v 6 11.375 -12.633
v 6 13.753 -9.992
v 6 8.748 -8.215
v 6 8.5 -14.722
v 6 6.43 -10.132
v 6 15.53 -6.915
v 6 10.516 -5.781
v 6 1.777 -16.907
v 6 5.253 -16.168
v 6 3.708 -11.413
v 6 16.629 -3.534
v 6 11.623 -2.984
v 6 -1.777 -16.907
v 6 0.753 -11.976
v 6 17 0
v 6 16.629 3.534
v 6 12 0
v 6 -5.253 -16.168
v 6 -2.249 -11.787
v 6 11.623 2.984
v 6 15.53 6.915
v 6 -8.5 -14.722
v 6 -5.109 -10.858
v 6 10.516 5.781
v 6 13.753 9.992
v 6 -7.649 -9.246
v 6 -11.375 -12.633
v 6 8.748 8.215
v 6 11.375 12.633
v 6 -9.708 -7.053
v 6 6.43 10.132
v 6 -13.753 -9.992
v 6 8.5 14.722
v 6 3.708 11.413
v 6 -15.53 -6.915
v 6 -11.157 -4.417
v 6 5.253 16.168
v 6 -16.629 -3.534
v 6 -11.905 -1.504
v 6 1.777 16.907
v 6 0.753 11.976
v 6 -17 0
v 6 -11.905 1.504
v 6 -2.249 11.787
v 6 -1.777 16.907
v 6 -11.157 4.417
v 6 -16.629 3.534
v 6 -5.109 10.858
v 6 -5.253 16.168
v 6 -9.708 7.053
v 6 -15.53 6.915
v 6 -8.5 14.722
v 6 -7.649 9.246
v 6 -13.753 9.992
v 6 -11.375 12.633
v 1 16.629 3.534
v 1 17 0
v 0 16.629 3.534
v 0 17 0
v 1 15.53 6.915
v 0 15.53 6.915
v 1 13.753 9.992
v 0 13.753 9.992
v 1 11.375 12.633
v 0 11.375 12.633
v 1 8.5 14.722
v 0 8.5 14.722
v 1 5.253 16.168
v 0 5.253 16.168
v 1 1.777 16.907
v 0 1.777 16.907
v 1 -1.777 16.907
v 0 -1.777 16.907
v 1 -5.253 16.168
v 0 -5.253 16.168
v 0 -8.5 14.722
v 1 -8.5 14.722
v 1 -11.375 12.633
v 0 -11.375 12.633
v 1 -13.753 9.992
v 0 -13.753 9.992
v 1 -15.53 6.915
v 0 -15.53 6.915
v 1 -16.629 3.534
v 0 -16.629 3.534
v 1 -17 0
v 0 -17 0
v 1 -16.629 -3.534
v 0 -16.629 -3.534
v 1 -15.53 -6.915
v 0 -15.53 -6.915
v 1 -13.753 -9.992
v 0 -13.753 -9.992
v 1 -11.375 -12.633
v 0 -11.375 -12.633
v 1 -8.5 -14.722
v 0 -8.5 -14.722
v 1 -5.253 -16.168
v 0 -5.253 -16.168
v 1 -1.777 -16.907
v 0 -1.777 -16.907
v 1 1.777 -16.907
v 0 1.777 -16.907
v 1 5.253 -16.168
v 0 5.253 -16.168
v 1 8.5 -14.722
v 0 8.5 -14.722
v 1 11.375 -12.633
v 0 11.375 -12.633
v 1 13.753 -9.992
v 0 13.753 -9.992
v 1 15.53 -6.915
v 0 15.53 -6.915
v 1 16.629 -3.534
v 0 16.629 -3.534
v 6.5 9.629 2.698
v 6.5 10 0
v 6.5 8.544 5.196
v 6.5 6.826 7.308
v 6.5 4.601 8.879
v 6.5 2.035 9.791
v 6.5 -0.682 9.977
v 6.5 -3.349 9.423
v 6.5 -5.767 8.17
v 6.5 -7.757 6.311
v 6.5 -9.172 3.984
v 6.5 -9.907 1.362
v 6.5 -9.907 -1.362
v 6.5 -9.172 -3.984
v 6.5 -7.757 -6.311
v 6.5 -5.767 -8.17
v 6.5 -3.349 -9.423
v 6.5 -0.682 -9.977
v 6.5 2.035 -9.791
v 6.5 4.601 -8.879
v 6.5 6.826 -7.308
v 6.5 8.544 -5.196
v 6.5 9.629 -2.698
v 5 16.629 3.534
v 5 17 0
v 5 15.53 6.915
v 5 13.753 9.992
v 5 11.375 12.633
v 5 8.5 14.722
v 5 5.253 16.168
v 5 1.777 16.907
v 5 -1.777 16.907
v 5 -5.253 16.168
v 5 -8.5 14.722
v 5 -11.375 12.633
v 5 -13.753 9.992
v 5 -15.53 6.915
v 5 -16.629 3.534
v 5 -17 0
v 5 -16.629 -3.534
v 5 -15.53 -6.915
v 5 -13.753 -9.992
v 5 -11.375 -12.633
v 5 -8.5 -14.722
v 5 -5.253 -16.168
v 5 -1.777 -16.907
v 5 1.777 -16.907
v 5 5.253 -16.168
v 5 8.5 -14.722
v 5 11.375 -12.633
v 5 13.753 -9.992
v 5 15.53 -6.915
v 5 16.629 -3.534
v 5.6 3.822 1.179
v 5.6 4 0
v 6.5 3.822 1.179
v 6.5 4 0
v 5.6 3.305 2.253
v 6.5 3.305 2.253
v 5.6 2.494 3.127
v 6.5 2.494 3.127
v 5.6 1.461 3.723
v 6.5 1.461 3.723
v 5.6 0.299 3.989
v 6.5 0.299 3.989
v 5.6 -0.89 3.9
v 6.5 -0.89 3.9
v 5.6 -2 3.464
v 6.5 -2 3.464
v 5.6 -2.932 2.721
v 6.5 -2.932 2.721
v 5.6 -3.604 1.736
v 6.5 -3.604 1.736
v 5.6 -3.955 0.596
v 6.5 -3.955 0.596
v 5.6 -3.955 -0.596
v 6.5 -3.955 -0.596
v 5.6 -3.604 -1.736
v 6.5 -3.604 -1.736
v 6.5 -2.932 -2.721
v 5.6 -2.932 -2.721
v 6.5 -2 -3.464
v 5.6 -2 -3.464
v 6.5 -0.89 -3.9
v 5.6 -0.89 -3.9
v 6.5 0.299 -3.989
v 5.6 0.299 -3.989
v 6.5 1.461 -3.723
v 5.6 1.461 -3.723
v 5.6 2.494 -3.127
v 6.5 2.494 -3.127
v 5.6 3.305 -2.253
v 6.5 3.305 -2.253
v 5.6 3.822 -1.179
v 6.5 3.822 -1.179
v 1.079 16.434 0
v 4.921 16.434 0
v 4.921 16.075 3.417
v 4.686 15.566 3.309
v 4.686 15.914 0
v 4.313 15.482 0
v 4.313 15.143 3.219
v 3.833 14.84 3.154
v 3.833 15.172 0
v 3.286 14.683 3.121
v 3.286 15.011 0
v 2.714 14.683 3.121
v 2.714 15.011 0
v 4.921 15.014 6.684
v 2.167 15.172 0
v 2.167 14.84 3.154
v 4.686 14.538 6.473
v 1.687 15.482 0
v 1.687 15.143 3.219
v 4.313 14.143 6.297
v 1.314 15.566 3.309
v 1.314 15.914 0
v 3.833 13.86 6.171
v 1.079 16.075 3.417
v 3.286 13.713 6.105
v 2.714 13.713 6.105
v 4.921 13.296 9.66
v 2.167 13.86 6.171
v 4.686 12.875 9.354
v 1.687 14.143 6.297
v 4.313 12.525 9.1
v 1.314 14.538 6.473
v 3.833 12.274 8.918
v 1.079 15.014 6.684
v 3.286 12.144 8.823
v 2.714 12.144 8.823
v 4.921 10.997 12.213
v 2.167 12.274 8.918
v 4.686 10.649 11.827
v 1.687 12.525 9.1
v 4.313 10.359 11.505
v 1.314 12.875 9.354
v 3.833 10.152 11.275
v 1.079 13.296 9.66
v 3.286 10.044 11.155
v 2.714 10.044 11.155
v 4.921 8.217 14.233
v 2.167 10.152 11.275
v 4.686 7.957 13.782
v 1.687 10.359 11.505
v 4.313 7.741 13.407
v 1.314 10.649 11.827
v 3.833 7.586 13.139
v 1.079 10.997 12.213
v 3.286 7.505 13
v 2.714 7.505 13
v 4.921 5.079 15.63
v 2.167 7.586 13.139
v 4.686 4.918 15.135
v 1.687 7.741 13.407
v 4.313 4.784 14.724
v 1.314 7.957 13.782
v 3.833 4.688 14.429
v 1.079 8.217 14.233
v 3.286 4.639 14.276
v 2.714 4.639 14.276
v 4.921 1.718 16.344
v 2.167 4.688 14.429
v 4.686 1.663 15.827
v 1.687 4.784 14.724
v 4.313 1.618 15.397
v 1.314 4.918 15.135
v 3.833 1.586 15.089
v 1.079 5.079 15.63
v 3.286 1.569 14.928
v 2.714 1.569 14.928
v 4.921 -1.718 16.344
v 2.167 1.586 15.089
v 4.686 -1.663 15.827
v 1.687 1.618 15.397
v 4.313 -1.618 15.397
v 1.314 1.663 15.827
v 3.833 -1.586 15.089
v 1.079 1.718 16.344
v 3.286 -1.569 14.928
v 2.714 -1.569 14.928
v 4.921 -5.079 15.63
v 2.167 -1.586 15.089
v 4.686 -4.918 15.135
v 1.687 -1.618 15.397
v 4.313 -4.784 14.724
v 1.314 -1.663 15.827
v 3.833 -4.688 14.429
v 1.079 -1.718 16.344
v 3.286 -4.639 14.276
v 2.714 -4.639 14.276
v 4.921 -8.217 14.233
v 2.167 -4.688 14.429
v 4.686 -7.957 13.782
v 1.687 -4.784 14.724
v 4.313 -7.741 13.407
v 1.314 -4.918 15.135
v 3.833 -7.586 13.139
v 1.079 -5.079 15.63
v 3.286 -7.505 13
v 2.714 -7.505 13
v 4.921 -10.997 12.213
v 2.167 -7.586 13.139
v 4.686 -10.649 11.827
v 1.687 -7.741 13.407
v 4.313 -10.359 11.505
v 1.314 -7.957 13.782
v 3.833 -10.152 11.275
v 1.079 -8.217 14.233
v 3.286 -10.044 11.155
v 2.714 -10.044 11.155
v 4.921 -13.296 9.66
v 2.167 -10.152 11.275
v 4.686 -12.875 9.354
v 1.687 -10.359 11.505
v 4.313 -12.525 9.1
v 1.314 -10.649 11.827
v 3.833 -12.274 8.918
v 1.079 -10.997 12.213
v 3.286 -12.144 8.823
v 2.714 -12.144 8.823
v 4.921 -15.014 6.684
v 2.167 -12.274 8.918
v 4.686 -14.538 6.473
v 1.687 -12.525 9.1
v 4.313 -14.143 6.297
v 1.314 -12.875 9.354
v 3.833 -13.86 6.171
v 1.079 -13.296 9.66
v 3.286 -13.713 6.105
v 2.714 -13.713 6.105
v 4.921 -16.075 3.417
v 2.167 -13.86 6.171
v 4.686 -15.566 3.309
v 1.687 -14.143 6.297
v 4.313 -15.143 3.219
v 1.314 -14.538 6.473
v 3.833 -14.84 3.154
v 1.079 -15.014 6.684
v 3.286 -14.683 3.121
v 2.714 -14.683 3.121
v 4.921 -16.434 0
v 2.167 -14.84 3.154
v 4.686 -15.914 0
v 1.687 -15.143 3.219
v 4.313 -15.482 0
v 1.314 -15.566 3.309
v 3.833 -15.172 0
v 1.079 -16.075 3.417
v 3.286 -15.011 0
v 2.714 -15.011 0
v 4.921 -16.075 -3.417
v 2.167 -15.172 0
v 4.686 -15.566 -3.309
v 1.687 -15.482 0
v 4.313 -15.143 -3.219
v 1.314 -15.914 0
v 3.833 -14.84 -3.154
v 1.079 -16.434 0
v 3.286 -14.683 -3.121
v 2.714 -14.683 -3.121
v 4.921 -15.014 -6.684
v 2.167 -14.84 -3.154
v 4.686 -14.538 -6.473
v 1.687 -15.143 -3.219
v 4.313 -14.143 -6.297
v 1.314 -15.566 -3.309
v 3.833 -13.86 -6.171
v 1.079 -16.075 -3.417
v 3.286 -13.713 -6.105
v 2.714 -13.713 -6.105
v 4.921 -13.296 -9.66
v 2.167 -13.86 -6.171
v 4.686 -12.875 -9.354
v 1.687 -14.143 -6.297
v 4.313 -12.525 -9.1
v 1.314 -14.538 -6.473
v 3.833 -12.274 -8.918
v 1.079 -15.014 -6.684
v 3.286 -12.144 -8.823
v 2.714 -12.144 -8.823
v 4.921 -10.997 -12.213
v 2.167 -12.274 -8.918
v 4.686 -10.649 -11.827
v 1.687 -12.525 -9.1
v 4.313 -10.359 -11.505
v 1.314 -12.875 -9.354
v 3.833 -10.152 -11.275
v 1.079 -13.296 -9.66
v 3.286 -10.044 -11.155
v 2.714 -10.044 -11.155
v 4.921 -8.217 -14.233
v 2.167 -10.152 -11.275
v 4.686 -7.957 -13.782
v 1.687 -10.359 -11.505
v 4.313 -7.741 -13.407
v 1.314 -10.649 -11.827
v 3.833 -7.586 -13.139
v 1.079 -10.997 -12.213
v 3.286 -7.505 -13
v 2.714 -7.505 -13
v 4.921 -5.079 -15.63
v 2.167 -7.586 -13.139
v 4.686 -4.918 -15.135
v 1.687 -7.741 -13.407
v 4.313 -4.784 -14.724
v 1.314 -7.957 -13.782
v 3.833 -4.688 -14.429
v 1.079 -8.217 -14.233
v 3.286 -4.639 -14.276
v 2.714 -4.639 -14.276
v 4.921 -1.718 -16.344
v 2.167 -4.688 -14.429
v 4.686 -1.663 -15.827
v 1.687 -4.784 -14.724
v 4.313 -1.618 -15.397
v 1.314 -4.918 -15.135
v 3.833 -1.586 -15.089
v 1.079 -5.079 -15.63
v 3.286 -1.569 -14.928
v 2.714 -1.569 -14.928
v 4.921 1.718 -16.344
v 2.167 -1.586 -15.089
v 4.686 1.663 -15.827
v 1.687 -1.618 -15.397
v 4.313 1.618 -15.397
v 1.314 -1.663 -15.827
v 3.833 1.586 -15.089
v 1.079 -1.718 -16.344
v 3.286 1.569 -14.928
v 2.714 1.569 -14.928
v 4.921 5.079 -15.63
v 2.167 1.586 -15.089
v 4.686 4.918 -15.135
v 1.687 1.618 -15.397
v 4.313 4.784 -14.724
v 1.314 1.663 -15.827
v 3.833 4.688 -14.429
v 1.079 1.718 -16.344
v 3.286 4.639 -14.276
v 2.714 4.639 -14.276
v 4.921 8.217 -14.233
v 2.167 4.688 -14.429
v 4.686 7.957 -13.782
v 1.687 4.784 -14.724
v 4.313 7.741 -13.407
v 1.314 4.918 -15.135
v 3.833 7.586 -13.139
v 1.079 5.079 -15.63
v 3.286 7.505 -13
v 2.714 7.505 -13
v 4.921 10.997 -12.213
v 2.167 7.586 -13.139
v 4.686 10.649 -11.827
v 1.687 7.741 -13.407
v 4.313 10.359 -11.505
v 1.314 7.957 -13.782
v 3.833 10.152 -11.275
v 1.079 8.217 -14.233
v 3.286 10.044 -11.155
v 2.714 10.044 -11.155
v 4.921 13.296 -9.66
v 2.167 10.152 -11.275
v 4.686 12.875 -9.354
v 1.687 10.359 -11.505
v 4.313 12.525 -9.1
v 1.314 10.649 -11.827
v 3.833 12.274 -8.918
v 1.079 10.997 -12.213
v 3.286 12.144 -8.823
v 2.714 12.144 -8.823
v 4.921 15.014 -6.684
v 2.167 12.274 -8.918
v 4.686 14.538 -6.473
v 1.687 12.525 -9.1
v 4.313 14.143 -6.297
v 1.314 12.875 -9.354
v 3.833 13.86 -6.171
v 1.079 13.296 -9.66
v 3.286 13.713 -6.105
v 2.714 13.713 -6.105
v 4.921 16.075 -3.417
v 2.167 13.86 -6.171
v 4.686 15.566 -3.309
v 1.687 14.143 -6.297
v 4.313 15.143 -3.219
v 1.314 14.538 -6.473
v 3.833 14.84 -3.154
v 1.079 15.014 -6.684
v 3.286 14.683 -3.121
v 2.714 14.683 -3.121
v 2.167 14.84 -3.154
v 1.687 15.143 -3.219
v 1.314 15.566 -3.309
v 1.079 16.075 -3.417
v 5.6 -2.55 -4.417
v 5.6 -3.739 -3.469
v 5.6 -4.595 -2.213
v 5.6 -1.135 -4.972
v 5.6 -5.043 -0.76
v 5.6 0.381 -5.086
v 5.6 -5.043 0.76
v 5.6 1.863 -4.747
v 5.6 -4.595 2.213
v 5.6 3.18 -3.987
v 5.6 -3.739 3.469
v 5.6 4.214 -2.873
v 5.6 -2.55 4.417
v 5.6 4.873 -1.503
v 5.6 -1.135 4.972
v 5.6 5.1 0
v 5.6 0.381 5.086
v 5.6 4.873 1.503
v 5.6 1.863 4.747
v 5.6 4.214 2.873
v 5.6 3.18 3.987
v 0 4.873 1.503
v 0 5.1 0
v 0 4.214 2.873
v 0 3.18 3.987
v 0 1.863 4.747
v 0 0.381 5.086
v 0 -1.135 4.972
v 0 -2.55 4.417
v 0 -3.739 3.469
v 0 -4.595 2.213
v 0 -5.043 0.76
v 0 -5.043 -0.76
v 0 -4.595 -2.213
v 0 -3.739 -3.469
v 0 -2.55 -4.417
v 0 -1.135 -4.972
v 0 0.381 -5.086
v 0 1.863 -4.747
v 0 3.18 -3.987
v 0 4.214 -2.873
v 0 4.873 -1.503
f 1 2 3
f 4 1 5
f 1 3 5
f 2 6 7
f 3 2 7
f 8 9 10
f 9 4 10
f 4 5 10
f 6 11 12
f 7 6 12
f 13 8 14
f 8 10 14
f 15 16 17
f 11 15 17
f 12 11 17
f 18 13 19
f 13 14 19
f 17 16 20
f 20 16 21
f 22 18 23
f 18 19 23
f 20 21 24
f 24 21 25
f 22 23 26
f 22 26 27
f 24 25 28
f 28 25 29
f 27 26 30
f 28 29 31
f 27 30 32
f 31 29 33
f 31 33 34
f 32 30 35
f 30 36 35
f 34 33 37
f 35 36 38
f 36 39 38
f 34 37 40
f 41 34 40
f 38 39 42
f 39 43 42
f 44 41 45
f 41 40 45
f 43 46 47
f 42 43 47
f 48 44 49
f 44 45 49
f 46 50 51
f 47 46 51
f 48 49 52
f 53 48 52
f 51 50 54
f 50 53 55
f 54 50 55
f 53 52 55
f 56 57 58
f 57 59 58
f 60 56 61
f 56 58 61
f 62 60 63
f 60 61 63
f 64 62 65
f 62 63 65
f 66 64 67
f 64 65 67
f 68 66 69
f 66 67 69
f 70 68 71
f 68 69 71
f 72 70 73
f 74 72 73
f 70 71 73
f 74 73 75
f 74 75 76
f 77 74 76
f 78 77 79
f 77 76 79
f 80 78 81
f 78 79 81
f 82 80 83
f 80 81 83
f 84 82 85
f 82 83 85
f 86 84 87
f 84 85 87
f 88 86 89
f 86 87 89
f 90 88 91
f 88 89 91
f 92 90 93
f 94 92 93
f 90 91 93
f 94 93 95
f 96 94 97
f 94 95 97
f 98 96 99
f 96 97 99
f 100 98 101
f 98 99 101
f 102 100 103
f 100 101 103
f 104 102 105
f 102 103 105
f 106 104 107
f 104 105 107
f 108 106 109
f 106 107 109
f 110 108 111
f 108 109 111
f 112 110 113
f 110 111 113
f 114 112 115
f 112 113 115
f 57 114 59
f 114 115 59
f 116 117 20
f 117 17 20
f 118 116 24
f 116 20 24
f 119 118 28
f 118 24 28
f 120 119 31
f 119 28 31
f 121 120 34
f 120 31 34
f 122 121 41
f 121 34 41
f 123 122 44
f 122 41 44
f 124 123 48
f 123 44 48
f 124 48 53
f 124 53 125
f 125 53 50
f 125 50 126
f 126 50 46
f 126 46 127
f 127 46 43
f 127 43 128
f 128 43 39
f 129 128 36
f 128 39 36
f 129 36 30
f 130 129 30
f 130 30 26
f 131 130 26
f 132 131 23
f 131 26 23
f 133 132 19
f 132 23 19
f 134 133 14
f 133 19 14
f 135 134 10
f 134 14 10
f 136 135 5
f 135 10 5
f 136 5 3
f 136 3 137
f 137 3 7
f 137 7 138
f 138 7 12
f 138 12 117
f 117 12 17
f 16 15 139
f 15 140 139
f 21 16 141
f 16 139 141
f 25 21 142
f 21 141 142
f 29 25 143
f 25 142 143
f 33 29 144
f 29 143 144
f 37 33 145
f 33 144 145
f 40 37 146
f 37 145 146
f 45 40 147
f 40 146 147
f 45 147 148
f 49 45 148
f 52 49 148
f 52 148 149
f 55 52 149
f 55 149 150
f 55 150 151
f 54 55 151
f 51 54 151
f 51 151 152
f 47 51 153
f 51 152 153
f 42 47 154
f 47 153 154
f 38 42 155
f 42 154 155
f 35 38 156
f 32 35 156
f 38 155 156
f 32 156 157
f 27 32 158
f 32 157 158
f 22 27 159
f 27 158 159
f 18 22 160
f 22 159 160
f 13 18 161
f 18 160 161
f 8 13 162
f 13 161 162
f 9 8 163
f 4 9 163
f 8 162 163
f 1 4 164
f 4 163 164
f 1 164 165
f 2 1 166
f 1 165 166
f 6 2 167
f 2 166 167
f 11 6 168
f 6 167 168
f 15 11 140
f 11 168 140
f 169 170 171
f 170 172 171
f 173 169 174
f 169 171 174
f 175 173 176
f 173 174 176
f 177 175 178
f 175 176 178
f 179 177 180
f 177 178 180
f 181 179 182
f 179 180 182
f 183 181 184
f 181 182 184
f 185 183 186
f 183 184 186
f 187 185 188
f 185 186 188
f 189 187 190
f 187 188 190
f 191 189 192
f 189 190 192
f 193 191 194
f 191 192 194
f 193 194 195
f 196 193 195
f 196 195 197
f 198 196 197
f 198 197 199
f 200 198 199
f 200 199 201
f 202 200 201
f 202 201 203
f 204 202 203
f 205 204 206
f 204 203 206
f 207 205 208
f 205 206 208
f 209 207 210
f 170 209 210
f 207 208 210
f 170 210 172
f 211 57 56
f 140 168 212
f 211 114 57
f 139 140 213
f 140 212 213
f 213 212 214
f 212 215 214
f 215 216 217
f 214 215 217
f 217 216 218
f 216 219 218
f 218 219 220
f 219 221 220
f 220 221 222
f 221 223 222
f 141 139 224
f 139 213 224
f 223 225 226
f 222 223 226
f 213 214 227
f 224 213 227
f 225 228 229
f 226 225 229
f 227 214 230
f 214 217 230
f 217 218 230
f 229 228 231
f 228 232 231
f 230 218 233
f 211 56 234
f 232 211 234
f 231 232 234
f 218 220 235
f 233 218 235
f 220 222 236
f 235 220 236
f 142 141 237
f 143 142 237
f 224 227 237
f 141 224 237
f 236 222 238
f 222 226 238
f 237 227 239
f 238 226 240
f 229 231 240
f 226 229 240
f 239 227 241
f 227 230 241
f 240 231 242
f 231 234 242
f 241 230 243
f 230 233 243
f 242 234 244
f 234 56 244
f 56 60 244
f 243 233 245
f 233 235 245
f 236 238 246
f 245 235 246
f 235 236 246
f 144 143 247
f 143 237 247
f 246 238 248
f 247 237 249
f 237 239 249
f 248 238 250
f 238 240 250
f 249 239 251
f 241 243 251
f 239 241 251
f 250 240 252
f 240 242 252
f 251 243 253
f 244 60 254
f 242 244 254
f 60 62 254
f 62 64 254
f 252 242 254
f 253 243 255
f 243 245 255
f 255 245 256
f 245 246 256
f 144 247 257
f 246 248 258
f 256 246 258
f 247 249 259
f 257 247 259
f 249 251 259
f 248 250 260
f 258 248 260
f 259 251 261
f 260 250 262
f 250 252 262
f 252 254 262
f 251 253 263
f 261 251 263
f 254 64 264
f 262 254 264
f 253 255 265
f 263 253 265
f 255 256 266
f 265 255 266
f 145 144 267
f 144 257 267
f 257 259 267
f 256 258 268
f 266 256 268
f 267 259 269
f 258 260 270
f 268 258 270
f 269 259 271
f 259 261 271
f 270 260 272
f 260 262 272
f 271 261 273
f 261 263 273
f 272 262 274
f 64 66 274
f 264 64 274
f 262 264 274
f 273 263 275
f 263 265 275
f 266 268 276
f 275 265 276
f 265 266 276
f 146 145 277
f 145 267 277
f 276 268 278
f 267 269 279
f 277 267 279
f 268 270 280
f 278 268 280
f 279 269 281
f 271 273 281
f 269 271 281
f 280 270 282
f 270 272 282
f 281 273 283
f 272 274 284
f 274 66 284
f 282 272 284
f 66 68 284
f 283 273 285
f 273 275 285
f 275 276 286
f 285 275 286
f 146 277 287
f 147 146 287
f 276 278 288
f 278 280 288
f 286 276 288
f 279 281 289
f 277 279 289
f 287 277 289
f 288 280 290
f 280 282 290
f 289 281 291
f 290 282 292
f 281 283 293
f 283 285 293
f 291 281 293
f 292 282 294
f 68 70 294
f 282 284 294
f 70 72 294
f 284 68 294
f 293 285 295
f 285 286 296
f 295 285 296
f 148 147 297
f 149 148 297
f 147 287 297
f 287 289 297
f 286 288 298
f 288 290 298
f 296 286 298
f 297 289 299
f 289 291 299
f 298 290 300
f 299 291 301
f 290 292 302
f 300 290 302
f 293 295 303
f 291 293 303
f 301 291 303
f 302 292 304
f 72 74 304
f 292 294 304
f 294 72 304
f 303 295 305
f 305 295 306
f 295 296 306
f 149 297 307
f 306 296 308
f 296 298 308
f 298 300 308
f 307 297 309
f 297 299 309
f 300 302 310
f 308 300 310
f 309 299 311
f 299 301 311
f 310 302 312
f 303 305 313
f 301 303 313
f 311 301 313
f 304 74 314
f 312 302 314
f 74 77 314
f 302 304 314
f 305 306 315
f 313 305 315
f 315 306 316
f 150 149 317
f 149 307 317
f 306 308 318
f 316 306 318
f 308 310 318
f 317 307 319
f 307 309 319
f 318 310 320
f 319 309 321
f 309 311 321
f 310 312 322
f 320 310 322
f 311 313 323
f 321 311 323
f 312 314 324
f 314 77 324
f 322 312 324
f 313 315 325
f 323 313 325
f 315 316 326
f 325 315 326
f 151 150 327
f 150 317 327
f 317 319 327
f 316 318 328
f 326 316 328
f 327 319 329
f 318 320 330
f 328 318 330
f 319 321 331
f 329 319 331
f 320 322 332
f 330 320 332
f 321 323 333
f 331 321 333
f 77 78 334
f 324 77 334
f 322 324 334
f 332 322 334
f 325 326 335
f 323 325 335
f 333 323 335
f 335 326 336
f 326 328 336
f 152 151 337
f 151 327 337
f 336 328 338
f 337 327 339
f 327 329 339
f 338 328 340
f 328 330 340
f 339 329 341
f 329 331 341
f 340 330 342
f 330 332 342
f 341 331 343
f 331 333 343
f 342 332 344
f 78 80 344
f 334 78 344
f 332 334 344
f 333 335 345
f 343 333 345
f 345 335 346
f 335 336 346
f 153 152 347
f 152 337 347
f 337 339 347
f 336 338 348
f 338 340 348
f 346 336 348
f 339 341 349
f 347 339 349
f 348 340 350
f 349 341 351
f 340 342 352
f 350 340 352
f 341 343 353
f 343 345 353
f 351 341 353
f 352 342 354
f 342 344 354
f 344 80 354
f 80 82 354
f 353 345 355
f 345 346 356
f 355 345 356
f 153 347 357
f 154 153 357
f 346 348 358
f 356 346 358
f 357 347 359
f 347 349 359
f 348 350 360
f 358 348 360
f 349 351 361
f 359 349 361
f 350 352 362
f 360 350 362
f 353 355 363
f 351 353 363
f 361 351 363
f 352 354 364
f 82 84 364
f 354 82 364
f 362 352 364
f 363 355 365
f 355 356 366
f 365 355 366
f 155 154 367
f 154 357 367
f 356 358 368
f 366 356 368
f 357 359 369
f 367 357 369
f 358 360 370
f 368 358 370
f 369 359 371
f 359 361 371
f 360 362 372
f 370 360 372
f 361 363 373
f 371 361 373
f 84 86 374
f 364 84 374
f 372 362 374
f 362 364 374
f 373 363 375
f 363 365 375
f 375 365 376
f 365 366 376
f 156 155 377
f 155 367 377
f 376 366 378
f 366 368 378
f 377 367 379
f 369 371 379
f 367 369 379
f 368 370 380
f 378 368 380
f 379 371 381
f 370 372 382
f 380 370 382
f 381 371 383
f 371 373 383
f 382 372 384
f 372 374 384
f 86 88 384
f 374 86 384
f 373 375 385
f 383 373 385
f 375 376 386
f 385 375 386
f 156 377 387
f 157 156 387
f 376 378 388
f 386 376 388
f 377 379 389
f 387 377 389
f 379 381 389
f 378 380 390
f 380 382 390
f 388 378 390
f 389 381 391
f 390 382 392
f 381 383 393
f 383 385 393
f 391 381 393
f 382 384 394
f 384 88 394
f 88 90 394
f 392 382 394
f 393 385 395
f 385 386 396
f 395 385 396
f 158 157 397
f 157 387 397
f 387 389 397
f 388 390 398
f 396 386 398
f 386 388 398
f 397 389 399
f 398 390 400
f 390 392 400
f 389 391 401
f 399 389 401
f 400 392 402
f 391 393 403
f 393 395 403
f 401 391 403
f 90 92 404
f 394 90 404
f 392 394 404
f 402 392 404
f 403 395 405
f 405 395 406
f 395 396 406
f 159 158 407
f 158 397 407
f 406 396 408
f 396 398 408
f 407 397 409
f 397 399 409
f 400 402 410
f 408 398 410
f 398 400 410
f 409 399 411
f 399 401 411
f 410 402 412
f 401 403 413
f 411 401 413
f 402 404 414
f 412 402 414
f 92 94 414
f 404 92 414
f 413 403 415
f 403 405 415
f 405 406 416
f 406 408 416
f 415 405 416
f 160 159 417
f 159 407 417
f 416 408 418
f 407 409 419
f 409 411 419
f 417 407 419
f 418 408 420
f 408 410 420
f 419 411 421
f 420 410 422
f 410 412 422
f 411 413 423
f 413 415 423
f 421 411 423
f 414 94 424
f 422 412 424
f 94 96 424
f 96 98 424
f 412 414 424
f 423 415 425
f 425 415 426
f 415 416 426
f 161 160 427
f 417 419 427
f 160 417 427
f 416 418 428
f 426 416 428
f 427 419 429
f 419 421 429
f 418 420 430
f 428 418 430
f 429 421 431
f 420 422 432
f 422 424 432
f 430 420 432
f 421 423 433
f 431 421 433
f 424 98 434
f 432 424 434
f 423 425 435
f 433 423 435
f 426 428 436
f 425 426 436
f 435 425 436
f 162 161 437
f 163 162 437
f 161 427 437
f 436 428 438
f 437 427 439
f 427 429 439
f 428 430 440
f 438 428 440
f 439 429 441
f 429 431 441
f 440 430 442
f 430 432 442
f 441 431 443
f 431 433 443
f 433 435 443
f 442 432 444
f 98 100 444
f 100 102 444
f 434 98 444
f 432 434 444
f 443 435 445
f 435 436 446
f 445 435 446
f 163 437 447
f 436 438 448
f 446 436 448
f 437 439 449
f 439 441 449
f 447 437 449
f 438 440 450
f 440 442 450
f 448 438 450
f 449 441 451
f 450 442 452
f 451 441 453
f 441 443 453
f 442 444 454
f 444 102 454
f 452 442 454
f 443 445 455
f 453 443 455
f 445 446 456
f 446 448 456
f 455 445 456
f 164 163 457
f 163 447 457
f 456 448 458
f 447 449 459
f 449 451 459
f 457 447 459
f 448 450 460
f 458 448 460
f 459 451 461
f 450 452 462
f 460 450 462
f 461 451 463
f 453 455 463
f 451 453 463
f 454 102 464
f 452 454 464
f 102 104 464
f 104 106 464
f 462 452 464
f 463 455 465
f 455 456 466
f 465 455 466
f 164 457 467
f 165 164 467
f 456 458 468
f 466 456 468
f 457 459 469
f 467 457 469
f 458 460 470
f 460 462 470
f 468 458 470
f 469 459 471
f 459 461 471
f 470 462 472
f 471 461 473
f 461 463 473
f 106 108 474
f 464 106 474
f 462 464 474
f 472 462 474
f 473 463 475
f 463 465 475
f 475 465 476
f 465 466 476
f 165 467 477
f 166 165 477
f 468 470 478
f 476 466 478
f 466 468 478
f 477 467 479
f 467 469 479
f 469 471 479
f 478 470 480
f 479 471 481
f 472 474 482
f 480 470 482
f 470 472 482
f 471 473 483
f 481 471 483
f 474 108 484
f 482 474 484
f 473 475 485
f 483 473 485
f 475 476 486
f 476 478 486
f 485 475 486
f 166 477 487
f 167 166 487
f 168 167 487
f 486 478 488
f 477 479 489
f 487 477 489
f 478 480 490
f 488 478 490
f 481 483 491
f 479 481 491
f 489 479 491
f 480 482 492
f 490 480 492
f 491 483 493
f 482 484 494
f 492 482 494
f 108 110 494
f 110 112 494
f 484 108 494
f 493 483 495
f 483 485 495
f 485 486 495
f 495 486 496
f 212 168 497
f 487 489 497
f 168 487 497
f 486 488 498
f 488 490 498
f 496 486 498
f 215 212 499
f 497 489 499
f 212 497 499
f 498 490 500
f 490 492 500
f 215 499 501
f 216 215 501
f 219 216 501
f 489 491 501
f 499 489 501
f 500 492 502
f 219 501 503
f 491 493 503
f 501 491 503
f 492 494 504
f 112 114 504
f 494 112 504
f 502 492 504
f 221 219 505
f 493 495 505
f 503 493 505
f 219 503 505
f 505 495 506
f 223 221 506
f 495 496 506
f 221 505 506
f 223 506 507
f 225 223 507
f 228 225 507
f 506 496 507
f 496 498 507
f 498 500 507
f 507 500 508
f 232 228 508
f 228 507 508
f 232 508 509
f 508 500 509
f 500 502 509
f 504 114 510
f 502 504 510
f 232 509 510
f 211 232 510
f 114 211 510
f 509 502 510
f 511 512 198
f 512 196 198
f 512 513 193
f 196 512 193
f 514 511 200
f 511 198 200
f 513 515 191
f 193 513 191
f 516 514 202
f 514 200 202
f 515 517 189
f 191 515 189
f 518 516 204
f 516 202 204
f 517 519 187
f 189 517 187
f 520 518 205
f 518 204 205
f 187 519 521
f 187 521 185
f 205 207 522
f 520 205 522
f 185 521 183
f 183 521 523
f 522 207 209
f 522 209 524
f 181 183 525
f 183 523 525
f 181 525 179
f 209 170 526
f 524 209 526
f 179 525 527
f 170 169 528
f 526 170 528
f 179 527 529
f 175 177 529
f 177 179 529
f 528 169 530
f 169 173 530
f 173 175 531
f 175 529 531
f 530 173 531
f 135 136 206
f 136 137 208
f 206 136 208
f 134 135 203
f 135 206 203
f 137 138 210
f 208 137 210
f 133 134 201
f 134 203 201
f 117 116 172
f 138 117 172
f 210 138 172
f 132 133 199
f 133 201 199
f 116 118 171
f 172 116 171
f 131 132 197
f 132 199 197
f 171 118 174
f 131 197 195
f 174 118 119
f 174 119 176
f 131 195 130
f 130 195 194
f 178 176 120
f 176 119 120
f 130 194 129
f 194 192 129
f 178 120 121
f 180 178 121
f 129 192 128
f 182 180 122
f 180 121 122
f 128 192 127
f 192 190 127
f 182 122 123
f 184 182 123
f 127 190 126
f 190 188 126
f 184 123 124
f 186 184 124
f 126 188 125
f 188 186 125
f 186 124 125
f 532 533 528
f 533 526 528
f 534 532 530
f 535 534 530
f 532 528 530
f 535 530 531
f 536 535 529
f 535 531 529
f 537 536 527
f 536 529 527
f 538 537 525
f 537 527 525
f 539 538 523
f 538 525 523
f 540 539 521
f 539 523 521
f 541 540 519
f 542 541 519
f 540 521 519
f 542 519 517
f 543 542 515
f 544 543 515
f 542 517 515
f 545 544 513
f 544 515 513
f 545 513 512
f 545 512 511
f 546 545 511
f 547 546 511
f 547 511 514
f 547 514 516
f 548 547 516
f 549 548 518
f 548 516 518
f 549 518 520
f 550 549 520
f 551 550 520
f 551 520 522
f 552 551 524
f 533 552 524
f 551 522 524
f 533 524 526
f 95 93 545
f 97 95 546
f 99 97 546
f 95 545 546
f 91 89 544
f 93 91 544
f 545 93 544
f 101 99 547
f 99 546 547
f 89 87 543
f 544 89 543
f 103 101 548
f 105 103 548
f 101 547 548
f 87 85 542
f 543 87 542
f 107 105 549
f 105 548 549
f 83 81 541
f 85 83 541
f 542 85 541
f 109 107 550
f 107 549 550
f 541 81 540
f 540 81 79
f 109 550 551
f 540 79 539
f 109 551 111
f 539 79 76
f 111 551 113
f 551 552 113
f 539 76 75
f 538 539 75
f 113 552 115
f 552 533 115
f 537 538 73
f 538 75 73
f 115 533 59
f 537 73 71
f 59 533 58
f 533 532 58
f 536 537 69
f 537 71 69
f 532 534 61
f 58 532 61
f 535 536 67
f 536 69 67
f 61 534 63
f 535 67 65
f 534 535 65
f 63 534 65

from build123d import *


with BuildPart() as part:
    # 草图1 → 旋转1 (revolve)
    with BuildSketch(Plane.XY):
        with BuildLine():
            Line((5.6, 5.1), (5.6, 4))
            Line((5.6, 4), (6.5, 4))
            Line((6.5, 4), (6.5, 10))
            Line((6.5, 10), (6, 12))
            Line((6, 12), (6, 17))
            Line((6, 17), (5, 17))
            ThreePointArc((5, 17), (3, 14.990135067), (1, 17))
            Line((1, 17), (0, 17))
            Line((0, 17), (0, 5.1))
            Line((0, 5.1), (5.6, 5.1))
        make_face()
    revolve(axis=Axis((0, 0, 0), (1, 0, 0)))


solid = part.part
